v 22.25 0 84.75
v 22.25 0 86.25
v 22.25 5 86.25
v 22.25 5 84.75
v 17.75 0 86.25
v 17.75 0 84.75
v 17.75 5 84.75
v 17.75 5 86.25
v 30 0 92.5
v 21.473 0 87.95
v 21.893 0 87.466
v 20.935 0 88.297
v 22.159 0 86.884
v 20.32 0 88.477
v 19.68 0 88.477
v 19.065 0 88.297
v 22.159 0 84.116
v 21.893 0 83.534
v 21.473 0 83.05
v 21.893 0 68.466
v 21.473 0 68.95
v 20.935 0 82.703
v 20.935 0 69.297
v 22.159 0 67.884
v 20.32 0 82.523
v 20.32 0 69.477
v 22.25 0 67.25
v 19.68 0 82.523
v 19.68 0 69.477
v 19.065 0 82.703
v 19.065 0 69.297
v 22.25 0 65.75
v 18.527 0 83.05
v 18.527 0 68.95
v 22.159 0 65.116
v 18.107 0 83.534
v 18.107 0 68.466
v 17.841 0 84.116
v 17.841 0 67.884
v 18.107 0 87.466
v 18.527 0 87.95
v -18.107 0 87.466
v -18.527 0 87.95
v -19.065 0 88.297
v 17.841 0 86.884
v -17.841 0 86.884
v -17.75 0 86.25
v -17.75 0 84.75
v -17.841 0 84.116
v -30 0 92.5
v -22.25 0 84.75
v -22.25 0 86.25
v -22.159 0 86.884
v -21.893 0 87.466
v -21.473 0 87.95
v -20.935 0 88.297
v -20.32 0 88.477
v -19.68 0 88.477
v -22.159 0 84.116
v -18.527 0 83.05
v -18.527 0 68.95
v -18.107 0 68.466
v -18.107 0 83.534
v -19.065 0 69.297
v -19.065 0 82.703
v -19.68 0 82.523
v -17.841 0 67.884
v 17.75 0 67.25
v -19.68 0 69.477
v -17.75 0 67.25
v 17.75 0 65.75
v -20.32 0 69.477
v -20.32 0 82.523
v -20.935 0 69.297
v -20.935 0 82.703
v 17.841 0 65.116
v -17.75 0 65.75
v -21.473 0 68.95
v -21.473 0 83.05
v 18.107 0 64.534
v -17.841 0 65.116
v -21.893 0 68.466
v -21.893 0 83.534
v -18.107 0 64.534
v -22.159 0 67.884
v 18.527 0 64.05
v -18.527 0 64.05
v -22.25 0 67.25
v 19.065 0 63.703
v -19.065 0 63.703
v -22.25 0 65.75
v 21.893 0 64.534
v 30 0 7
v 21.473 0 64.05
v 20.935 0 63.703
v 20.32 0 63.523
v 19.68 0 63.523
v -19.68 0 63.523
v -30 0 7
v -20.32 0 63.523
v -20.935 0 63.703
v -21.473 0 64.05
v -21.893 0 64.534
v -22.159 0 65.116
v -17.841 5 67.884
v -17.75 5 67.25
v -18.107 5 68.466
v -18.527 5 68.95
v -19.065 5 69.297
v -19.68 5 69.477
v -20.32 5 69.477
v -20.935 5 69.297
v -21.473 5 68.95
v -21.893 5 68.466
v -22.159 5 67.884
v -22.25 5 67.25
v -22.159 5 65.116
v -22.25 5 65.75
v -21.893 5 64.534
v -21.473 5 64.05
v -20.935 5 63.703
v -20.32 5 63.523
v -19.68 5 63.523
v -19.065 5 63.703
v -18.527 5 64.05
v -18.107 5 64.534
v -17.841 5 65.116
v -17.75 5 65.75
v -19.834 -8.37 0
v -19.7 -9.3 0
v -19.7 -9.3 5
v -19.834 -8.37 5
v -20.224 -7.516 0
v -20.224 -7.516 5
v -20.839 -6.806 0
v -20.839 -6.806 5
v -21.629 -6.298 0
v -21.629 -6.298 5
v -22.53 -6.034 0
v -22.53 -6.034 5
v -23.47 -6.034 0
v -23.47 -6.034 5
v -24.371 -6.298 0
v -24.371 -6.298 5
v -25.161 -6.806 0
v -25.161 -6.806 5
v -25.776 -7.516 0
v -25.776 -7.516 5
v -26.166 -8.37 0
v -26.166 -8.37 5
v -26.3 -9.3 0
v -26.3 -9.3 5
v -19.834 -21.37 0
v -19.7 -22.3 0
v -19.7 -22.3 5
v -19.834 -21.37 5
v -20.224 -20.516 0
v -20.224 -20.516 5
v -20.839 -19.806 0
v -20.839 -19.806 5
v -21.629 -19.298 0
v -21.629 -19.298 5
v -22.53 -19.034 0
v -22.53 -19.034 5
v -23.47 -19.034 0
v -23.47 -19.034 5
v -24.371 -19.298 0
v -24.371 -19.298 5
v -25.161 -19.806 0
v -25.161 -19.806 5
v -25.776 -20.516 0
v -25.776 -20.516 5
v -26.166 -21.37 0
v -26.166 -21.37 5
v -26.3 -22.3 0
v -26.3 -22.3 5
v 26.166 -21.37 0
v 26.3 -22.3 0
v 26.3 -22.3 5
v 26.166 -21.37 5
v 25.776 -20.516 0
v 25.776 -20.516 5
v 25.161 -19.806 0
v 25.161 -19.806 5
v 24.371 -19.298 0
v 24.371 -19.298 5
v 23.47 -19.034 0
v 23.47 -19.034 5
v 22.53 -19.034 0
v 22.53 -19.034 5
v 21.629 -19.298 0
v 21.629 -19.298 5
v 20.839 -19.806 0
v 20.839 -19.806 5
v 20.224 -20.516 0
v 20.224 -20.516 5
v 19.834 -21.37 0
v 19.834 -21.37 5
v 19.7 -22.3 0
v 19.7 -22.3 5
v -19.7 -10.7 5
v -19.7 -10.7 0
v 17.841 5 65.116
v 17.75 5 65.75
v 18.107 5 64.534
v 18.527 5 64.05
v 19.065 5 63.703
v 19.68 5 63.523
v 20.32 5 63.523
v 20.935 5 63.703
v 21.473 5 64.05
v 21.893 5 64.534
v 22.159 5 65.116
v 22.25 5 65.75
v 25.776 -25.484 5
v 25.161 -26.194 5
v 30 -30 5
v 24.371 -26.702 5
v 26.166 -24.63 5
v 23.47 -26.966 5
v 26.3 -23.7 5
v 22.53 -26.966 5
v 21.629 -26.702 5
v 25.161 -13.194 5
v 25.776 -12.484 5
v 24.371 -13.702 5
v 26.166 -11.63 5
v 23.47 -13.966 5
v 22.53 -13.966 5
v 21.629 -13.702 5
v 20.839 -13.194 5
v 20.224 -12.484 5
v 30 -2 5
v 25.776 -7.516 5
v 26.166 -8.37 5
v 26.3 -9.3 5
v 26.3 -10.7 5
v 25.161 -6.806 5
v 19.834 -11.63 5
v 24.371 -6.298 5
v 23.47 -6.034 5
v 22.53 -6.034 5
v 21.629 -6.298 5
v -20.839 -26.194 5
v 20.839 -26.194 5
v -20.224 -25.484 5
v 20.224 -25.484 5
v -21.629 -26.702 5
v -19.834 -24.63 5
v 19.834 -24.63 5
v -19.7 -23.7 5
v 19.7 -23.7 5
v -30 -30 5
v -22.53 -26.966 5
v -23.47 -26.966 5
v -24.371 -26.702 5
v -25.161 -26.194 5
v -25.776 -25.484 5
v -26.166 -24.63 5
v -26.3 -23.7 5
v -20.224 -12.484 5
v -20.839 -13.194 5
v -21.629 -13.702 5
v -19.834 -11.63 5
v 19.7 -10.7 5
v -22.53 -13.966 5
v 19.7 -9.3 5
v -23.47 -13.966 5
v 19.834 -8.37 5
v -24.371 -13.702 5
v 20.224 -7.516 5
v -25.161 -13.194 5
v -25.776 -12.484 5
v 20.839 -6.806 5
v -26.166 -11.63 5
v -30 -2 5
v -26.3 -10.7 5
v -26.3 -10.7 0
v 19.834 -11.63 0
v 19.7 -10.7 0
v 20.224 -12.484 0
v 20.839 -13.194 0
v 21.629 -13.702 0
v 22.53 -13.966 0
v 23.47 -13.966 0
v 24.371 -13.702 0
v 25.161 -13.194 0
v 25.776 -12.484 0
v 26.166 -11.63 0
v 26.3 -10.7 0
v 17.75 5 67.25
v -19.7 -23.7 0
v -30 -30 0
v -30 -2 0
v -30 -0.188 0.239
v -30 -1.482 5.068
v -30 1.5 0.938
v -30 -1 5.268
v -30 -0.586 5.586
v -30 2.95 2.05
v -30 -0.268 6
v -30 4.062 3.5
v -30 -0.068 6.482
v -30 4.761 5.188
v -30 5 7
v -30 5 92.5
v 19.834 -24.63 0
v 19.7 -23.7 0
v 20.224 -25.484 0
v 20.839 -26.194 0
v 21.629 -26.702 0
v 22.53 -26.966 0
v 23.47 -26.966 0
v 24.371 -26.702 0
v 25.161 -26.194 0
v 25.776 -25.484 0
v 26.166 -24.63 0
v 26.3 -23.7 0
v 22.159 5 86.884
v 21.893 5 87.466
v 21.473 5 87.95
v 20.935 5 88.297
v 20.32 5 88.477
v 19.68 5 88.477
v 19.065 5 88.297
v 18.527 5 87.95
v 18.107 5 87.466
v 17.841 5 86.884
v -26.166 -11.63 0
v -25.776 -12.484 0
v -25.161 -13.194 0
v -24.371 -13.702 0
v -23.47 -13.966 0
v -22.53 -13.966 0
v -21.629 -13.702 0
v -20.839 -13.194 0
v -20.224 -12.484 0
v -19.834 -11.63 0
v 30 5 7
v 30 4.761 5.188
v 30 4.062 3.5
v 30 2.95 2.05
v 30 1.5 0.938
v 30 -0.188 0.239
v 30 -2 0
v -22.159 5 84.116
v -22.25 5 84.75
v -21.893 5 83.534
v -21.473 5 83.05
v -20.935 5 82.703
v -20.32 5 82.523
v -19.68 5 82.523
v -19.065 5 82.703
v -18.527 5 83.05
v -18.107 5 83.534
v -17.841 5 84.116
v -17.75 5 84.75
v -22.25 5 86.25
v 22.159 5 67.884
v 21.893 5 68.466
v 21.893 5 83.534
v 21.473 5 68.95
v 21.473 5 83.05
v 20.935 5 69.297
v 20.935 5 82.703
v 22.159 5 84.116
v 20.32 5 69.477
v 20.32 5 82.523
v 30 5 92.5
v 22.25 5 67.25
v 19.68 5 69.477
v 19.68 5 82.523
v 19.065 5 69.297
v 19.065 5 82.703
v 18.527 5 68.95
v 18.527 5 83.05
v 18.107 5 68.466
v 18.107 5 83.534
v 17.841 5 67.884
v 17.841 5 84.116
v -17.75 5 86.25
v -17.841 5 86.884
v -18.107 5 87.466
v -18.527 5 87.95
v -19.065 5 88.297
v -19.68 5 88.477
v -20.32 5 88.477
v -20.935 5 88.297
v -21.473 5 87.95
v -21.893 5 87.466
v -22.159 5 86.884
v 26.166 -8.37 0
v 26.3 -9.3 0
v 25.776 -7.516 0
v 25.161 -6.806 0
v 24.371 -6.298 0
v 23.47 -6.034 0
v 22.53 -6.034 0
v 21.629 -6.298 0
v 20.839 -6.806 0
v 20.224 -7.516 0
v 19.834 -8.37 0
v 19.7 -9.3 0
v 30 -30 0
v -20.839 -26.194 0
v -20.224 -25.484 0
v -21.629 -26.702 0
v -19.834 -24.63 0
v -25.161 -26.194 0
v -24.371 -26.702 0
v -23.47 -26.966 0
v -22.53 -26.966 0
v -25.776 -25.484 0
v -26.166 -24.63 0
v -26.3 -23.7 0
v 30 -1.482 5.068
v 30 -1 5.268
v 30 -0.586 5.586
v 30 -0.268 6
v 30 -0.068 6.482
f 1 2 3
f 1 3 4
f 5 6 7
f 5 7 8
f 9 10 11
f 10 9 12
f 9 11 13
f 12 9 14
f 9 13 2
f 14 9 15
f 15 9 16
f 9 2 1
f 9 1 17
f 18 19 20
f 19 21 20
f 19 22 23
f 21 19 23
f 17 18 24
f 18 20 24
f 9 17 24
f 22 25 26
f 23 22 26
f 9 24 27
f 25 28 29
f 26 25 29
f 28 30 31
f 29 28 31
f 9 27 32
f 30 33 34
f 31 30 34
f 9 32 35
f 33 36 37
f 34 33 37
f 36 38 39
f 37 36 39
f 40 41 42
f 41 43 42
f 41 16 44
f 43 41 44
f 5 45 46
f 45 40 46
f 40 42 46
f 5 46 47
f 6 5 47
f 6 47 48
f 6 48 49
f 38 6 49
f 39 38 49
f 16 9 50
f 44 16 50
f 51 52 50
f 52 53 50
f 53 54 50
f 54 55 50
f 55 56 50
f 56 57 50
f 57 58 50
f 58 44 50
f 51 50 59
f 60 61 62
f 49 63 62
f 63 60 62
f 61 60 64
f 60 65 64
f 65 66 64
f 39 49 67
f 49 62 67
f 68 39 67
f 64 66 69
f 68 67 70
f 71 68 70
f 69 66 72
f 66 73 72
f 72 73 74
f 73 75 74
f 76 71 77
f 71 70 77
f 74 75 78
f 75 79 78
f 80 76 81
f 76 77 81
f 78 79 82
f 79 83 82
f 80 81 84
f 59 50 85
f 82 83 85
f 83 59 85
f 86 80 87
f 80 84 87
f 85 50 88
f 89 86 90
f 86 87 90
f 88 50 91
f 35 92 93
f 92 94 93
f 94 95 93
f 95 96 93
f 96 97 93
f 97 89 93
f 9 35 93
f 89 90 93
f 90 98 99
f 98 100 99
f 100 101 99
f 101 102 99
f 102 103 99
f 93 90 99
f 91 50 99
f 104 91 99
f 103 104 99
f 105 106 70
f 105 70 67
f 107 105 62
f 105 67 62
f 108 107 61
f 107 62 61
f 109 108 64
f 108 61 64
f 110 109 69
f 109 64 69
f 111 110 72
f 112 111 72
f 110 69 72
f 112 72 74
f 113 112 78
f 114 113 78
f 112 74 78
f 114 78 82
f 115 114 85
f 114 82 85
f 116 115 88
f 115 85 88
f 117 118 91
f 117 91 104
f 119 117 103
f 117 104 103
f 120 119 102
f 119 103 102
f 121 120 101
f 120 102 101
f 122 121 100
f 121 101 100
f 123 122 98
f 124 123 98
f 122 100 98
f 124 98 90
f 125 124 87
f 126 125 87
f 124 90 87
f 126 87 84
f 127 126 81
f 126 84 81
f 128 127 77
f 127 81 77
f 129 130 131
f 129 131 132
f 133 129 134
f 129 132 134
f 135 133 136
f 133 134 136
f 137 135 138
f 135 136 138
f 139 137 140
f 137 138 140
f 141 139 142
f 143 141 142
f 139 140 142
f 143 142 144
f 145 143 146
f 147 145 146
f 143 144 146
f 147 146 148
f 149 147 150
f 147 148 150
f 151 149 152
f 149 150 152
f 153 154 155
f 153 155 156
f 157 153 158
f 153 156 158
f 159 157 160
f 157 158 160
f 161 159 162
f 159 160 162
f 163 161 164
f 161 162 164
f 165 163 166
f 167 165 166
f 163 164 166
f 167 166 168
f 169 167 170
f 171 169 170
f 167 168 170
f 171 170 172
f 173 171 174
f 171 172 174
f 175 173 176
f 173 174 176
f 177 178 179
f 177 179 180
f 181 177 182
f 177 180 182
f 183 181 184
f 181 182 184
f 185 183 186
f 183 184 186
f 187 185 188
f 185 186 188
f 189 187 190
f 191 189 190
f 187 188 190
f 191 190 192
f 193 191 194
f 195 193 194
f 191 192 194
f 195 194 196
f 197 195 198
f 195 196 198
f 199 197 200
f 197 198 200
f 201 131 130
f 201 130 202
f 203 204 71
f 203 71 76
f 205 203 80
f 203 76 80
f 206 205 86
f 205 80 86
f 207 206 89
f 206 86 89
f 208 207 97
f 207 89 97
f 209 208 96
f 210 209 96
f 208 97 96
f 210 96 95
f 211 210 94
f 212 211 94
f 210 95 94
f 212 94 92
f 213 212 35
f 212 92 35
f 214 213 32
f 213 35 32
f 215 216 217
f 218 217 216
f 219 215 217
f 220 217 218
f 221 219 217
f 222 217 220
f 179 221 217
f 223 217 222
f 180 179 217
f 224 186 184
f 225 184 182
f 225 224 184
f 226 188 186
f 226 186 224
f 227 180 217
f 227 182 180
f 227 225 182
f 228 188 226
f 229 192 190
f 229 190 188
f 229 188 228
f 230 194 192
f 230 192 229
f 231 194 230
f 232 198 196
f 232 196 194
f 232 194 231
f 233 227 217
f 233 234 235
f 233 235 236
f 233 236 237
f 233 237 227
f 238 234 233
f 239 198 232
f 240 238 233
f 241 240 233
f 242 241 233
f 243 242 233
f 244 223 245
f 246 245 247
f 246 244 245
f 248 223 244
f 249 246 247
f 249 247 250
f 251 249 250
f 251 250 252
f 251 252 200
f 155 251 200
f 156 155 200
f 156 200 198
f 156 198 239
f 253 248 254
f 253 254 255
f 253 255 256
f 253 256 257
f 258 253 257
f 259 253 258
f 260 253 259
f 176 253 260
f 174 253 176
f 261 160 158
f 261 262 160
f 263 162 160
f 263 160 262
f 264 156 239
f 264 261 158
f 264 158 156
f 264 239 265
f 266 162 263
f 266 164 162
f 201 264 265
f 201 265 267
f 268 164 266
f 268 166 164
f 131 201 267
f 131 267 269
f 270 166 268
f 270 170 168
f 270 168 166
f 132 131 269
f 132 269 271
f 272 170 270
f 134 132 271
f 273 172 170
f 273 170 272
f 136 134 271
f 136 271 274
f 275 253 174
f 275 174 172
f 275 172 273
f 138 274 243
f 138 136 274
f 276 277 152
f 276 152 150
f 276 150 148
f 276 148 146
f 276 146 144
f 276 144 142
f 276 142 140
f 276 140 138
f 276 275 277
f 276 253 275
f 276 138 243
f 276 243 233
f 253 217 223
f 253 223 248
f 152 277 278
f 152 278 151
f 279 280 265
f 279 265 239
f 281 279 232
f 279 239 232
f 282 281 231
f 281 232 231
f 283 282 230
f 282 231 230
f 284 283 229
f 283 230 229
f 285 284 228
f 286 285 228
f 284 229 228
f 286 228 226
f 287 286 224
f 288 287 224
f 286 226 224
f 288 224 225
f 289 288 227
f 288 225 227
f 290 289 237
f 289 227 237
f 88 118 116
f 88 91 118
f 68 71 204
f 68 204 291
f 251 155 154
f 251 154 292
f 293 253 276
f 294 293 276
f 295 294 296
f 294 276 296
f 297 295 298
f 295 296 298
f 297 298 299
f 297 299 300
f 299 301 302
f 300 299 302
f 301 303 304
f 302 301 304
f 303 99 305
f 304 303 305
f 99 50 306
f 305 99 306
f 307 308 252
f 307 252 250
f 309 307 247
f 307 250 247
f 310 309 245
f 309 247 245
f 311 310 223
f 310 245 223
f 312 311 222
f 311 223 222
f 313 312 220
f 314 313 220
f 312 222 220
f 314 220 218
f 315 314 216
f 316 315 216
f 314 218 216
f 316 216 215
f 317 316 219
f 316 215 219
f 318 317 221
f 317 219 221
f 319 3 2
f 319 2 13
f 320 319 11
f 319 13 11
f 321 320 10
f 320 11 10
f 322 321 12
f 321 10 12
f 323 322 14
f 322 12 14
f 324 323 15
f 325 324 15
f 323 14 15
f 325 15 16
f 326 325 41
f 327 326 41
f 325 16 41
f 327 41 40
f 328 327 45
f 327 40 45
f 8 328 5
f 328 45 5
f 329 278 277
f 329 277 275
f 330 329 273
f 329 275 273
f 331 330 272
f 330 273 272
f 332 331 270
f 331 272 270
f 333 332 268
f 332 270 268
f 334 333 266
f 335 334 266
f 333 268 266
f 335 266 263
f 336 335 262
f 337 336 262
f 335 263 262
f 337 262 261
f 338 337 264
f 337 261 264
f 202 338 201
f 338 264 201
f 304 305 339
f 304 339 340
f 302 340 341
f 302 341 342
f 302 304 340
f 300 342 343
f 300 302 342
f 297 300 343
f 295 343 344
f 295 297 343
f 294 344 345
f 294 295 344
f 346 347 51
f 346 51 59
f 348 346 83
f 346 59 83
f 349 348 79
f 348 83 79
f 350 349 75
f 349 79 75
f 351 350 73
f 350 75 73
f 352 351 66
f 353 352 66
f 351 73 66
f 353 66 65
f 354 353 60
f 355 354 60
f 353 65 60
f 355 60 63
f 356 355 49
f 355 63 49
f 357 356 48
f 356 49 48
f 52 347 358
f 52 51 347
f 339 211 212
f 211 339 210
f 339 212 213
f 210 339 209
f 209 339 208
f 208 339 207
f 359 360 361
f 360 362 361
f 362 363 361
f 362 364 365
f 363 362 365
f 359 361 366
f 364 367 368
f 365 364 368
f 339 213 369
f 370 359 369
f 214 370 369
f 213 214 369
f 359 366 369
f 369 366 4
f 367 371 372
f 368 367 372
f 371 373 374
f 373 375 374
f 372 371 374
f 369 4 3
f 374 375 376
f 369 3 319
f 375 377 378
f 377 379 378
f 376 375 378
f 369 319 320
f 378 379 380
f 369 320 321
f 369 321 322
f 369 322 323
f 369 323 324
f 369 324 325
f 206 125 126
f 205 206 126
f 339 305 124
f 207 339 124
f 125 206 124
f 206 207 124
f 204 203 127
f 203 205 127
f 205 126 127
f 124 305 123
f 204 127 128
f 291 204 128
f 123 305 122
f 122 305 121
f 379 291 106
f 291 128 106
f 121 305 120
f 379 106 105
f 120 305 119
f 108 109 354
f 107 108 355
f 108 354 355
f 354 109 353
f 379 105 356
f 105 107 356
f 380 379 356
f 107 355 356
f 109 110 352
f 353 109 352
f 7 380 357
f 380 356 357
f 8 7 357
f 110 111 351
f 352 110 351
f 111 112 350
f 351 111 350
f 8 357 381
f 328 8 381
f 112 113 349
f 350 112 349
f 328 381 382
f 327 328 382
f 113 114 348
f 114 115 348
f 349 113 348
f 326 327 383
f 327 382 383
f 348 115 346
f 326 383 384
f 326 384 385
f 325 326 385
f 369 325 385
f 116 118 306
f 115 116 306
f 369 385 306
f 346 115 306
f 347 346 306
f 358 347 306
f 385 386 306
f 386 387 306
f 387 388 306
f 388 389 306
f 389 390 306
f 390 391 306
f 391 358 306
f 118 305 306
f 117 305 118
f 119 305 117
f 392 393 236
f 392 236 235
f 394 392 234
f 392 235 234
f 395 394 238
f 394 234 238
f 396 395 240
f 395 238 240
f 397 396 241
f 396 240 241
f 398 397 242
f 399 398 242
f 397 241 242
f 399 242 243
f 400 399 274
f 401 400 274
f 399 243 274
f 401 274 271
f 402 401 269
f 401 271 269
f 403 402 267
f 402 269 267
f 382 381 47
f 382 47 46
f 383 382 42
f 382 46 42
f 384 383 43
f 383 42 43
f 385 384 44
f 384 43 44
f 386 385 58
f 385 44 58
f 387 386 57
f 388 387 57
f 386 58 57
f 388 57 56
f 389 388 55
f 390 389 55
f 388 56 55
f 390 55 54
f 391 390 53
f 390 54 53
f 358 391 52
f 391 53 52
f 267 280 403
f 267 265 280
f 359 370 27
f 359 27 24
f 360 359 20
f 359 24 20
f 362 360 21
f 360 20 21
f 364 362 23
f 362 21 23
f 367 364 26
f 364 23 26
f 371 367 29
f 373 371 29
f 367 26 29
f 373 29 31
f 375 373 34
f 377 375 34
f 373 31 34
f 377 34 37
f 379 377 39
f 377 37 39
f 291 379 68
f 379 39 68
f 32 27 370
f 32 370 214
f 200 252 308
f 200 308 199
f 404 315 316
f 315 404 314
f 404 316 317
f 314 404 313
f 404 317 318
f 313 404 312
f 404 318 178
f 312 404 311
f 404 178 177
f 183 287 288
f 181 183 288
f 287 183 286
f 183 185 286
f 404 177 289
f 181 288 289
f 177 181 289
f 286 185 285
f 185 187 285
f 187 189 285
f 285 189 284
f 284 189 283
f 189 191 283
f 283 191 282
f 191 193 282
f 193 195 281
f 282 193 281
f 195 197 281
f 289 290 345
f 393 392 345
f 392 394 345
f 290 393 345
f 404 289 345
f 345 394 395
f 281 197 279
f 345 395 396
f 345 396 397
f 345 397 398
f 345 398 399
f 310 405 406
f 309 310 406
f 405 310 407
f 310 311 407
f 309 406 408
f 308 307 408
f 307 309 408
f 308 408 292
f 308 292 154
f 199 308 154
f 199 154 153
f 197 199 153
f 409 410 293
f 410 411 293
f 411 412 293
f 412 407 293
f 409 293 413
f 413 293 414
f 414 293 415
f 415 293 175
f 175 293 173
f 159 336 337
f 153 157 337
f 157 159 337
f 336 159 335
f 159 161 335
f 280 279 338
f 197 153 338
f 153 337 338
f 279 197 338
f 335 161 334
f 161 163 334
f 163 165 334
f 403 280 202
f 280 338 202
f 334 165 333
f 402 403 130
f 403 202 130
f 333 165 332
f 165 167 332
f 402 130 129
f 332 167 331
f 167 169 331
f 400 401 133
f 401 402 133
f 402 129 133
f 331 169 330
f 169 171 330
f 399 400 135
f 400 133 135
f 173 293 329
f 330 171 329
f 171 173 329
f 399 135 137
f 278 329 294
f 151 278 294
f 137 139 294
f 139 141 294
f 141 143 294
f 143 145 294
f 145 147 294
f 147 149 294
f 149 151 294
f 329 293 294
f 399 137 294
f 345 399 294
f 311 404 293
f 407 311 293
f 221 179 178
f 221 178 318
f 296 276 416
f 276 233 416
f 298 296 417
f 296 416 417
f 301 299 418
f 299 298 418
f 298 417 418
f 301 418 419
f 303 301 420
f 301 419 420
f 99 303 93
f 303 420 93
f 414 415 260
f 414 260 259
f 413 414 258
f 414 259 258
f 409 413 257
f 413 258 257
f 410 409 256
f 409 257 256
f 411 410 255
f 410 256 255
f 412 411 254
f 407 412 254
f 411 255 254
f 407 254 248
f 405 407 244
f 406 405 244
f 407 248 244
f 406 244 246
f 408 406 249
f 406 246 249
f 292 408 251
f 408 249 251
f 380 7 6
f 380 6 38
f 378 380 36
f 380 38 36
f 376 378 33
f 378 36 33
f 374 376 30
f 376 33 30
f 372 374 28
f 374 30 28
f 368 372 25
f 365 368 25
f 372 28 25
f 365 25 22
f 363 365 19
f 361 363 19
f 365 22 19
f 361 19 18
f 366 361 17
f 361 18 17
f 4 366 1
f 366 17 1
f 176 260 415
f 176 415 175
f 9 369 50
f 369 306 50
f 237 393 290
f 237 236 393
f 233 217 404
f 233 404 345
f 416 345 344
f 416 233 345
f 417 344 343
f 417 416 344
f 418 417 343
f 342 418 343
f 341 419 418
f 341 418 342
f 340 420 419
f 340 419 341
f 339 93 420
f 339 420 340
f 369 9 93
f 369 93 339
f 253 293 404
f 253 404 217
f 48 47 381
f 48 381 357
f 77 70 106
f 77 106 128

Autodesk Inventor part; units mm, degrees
ref_plane "YZ Plane" through (0, 0, 0) normal (1, 0, 0) x (0, 1, 0)
ref_plane "XZ Plane" through (0, 0, 0) normal (0, 1, 0) x (-1, 0, 0)
ref_plane "XY Plane" through (0, 0, 0) normal (0, 0, 1) x (1, 0, 0)
sketch "Skizze1" plane through (0, 0, 0) normal (1, 0, 0) x (0, 1, 0)
  line L0 (5, 92.5) -> (0, 92.5)
  line L1 (0, 92.5) -> (0, 0)
  line L2 (0, 0) -> (5, 0)
  line L3 (5, 0) -> (5, 92.5)
  line L4 (-37, 0) -> (12, 0) projected
  line L5 (0, 0) -> (-30, 0)
  line L6 (-30, 0) -> (-30, 5)
  line L7 (-30, 5) -> (0, 5)
  line L8 (0, 5) -> (0, 0)
  dimension "d0" = 5
  dimension "d1" = 92.5
  dimension "d3" = 5
  dimension "d4" = 35
extrude "Extrusion1" add sketch "Skizze1" along normal mid plane 60
fillet "Rundung1" radius 2 1 edges at (0, 0, 5)
fillet "Rundung2" radius 7 1 edges at (0, 5, 0)
sketch "Skizze2" plane through (-30, 0, 92.5) normal (0, -1, 0) x (1, 0, 0)
  line L0 (0, -92.5) -> (60, -92.5) projected
  line L1 (60, 0) -> (60, -85.5) projected
  line L2 (0, -85.5) -> (0, 0) projected
  line L3 (10, -4) -> (10, -4)
  line L4 (12.25, -6.25) -> (12.25, -7.75)
  line L5 (10, -10) -> (10, -10)
  line L6 (7.75, -7.75) -> (7.75, -6.25)
  line L7 (7.75, -4) -> (12.25, -10) construction
  line L8 (12.25, -4) -> (7.75, -10) construction
  arc A0 (10, -4) -> (7.75, -6.25) centre (10, -6.25) ccw
  arc A1 (12.25, -6.25) -> (10, -4) centre (10, -6.25) ccw
  arc A2 (7.75, -7.75) -> (10, -10) centre (10, -7.75) ccw
  arc A3 (10, -10) -> (12.25, -7.75) centre (10, -7.75) ccw
  line L9 (60, 0) -> (0, 0) projected
  point P0 (30, -92.5)
  point P1 (10, -7)
  point P2 (10, -4)
  dimension "d12" = 60
  dimension "d13" = 10
  dimension "d14" = 4.5
  dimension "d15" = 6
  dimension "d16" = 2.25
  dimension "d39" = 7
extrude "Extrusion2" cut sketch "Skizze2" against normal blind 50
pattern_linear "Rechteckige Anordnung1" count 2 spacing 40 along (1, 0, 0) count 2 spacing 19 along (0, 0, -1) of "Extrusion2"
sketch "Skizze3" plane through (-30, -30, 5) normal (0, 0, 1) x (1, 0, 0)
  line L0 (7, 11) -> (7, 11)
  line L1 (10.3, 7.7) -> (10.3, 6.3)
  line L2 (7, 3) -> (7, 3)
  line L3 (3.7, 6.3) -> (3.7, 7.7)
  line L4 (3.7, 11) -> (10.3, 3) construction
  line L5 (10.3, 11) -> (3.7, 3) construction
  arc A0 (7, 11) -> (3.7, 7.7) centre (7, 7.7) ccw
  arc A1 (3.7, 6.3) -> (7, 3) centre (7, 6.3) ccw
  arc A2 (7, 3) -> (10.3, 6.3) centre (7, 6.3) ccw
  arc A3 (10.3, 7.7) -> (7, 11) centre (7, 7.7) ccw
  line L6 (0, 0) -> (0, 28) projected
  line L7 (0, 0) -> (60, 0) projected
  point P0 (30, 30)
  point P1 (7, 7)
  point P2 (7, 3)
  dimension "d26" = 6.6
  dimension "d27" = 8
  dimension "d28" = 3.3
  dimension "d29" = 7
  dimension "d30" = 7
extrude "Extrusion3" cut sketch "Skizze3" against normal through all
pattern_linear "Rechteckige Anordnung2" count 2 spacing 46 along (1, 0, 0) count 2 spacing 13 along (0, 1, 0) of "Extrusion3"
properties part number "TS_V1_Fallmagazin_Haltewinkel_Fuehrung_int"
